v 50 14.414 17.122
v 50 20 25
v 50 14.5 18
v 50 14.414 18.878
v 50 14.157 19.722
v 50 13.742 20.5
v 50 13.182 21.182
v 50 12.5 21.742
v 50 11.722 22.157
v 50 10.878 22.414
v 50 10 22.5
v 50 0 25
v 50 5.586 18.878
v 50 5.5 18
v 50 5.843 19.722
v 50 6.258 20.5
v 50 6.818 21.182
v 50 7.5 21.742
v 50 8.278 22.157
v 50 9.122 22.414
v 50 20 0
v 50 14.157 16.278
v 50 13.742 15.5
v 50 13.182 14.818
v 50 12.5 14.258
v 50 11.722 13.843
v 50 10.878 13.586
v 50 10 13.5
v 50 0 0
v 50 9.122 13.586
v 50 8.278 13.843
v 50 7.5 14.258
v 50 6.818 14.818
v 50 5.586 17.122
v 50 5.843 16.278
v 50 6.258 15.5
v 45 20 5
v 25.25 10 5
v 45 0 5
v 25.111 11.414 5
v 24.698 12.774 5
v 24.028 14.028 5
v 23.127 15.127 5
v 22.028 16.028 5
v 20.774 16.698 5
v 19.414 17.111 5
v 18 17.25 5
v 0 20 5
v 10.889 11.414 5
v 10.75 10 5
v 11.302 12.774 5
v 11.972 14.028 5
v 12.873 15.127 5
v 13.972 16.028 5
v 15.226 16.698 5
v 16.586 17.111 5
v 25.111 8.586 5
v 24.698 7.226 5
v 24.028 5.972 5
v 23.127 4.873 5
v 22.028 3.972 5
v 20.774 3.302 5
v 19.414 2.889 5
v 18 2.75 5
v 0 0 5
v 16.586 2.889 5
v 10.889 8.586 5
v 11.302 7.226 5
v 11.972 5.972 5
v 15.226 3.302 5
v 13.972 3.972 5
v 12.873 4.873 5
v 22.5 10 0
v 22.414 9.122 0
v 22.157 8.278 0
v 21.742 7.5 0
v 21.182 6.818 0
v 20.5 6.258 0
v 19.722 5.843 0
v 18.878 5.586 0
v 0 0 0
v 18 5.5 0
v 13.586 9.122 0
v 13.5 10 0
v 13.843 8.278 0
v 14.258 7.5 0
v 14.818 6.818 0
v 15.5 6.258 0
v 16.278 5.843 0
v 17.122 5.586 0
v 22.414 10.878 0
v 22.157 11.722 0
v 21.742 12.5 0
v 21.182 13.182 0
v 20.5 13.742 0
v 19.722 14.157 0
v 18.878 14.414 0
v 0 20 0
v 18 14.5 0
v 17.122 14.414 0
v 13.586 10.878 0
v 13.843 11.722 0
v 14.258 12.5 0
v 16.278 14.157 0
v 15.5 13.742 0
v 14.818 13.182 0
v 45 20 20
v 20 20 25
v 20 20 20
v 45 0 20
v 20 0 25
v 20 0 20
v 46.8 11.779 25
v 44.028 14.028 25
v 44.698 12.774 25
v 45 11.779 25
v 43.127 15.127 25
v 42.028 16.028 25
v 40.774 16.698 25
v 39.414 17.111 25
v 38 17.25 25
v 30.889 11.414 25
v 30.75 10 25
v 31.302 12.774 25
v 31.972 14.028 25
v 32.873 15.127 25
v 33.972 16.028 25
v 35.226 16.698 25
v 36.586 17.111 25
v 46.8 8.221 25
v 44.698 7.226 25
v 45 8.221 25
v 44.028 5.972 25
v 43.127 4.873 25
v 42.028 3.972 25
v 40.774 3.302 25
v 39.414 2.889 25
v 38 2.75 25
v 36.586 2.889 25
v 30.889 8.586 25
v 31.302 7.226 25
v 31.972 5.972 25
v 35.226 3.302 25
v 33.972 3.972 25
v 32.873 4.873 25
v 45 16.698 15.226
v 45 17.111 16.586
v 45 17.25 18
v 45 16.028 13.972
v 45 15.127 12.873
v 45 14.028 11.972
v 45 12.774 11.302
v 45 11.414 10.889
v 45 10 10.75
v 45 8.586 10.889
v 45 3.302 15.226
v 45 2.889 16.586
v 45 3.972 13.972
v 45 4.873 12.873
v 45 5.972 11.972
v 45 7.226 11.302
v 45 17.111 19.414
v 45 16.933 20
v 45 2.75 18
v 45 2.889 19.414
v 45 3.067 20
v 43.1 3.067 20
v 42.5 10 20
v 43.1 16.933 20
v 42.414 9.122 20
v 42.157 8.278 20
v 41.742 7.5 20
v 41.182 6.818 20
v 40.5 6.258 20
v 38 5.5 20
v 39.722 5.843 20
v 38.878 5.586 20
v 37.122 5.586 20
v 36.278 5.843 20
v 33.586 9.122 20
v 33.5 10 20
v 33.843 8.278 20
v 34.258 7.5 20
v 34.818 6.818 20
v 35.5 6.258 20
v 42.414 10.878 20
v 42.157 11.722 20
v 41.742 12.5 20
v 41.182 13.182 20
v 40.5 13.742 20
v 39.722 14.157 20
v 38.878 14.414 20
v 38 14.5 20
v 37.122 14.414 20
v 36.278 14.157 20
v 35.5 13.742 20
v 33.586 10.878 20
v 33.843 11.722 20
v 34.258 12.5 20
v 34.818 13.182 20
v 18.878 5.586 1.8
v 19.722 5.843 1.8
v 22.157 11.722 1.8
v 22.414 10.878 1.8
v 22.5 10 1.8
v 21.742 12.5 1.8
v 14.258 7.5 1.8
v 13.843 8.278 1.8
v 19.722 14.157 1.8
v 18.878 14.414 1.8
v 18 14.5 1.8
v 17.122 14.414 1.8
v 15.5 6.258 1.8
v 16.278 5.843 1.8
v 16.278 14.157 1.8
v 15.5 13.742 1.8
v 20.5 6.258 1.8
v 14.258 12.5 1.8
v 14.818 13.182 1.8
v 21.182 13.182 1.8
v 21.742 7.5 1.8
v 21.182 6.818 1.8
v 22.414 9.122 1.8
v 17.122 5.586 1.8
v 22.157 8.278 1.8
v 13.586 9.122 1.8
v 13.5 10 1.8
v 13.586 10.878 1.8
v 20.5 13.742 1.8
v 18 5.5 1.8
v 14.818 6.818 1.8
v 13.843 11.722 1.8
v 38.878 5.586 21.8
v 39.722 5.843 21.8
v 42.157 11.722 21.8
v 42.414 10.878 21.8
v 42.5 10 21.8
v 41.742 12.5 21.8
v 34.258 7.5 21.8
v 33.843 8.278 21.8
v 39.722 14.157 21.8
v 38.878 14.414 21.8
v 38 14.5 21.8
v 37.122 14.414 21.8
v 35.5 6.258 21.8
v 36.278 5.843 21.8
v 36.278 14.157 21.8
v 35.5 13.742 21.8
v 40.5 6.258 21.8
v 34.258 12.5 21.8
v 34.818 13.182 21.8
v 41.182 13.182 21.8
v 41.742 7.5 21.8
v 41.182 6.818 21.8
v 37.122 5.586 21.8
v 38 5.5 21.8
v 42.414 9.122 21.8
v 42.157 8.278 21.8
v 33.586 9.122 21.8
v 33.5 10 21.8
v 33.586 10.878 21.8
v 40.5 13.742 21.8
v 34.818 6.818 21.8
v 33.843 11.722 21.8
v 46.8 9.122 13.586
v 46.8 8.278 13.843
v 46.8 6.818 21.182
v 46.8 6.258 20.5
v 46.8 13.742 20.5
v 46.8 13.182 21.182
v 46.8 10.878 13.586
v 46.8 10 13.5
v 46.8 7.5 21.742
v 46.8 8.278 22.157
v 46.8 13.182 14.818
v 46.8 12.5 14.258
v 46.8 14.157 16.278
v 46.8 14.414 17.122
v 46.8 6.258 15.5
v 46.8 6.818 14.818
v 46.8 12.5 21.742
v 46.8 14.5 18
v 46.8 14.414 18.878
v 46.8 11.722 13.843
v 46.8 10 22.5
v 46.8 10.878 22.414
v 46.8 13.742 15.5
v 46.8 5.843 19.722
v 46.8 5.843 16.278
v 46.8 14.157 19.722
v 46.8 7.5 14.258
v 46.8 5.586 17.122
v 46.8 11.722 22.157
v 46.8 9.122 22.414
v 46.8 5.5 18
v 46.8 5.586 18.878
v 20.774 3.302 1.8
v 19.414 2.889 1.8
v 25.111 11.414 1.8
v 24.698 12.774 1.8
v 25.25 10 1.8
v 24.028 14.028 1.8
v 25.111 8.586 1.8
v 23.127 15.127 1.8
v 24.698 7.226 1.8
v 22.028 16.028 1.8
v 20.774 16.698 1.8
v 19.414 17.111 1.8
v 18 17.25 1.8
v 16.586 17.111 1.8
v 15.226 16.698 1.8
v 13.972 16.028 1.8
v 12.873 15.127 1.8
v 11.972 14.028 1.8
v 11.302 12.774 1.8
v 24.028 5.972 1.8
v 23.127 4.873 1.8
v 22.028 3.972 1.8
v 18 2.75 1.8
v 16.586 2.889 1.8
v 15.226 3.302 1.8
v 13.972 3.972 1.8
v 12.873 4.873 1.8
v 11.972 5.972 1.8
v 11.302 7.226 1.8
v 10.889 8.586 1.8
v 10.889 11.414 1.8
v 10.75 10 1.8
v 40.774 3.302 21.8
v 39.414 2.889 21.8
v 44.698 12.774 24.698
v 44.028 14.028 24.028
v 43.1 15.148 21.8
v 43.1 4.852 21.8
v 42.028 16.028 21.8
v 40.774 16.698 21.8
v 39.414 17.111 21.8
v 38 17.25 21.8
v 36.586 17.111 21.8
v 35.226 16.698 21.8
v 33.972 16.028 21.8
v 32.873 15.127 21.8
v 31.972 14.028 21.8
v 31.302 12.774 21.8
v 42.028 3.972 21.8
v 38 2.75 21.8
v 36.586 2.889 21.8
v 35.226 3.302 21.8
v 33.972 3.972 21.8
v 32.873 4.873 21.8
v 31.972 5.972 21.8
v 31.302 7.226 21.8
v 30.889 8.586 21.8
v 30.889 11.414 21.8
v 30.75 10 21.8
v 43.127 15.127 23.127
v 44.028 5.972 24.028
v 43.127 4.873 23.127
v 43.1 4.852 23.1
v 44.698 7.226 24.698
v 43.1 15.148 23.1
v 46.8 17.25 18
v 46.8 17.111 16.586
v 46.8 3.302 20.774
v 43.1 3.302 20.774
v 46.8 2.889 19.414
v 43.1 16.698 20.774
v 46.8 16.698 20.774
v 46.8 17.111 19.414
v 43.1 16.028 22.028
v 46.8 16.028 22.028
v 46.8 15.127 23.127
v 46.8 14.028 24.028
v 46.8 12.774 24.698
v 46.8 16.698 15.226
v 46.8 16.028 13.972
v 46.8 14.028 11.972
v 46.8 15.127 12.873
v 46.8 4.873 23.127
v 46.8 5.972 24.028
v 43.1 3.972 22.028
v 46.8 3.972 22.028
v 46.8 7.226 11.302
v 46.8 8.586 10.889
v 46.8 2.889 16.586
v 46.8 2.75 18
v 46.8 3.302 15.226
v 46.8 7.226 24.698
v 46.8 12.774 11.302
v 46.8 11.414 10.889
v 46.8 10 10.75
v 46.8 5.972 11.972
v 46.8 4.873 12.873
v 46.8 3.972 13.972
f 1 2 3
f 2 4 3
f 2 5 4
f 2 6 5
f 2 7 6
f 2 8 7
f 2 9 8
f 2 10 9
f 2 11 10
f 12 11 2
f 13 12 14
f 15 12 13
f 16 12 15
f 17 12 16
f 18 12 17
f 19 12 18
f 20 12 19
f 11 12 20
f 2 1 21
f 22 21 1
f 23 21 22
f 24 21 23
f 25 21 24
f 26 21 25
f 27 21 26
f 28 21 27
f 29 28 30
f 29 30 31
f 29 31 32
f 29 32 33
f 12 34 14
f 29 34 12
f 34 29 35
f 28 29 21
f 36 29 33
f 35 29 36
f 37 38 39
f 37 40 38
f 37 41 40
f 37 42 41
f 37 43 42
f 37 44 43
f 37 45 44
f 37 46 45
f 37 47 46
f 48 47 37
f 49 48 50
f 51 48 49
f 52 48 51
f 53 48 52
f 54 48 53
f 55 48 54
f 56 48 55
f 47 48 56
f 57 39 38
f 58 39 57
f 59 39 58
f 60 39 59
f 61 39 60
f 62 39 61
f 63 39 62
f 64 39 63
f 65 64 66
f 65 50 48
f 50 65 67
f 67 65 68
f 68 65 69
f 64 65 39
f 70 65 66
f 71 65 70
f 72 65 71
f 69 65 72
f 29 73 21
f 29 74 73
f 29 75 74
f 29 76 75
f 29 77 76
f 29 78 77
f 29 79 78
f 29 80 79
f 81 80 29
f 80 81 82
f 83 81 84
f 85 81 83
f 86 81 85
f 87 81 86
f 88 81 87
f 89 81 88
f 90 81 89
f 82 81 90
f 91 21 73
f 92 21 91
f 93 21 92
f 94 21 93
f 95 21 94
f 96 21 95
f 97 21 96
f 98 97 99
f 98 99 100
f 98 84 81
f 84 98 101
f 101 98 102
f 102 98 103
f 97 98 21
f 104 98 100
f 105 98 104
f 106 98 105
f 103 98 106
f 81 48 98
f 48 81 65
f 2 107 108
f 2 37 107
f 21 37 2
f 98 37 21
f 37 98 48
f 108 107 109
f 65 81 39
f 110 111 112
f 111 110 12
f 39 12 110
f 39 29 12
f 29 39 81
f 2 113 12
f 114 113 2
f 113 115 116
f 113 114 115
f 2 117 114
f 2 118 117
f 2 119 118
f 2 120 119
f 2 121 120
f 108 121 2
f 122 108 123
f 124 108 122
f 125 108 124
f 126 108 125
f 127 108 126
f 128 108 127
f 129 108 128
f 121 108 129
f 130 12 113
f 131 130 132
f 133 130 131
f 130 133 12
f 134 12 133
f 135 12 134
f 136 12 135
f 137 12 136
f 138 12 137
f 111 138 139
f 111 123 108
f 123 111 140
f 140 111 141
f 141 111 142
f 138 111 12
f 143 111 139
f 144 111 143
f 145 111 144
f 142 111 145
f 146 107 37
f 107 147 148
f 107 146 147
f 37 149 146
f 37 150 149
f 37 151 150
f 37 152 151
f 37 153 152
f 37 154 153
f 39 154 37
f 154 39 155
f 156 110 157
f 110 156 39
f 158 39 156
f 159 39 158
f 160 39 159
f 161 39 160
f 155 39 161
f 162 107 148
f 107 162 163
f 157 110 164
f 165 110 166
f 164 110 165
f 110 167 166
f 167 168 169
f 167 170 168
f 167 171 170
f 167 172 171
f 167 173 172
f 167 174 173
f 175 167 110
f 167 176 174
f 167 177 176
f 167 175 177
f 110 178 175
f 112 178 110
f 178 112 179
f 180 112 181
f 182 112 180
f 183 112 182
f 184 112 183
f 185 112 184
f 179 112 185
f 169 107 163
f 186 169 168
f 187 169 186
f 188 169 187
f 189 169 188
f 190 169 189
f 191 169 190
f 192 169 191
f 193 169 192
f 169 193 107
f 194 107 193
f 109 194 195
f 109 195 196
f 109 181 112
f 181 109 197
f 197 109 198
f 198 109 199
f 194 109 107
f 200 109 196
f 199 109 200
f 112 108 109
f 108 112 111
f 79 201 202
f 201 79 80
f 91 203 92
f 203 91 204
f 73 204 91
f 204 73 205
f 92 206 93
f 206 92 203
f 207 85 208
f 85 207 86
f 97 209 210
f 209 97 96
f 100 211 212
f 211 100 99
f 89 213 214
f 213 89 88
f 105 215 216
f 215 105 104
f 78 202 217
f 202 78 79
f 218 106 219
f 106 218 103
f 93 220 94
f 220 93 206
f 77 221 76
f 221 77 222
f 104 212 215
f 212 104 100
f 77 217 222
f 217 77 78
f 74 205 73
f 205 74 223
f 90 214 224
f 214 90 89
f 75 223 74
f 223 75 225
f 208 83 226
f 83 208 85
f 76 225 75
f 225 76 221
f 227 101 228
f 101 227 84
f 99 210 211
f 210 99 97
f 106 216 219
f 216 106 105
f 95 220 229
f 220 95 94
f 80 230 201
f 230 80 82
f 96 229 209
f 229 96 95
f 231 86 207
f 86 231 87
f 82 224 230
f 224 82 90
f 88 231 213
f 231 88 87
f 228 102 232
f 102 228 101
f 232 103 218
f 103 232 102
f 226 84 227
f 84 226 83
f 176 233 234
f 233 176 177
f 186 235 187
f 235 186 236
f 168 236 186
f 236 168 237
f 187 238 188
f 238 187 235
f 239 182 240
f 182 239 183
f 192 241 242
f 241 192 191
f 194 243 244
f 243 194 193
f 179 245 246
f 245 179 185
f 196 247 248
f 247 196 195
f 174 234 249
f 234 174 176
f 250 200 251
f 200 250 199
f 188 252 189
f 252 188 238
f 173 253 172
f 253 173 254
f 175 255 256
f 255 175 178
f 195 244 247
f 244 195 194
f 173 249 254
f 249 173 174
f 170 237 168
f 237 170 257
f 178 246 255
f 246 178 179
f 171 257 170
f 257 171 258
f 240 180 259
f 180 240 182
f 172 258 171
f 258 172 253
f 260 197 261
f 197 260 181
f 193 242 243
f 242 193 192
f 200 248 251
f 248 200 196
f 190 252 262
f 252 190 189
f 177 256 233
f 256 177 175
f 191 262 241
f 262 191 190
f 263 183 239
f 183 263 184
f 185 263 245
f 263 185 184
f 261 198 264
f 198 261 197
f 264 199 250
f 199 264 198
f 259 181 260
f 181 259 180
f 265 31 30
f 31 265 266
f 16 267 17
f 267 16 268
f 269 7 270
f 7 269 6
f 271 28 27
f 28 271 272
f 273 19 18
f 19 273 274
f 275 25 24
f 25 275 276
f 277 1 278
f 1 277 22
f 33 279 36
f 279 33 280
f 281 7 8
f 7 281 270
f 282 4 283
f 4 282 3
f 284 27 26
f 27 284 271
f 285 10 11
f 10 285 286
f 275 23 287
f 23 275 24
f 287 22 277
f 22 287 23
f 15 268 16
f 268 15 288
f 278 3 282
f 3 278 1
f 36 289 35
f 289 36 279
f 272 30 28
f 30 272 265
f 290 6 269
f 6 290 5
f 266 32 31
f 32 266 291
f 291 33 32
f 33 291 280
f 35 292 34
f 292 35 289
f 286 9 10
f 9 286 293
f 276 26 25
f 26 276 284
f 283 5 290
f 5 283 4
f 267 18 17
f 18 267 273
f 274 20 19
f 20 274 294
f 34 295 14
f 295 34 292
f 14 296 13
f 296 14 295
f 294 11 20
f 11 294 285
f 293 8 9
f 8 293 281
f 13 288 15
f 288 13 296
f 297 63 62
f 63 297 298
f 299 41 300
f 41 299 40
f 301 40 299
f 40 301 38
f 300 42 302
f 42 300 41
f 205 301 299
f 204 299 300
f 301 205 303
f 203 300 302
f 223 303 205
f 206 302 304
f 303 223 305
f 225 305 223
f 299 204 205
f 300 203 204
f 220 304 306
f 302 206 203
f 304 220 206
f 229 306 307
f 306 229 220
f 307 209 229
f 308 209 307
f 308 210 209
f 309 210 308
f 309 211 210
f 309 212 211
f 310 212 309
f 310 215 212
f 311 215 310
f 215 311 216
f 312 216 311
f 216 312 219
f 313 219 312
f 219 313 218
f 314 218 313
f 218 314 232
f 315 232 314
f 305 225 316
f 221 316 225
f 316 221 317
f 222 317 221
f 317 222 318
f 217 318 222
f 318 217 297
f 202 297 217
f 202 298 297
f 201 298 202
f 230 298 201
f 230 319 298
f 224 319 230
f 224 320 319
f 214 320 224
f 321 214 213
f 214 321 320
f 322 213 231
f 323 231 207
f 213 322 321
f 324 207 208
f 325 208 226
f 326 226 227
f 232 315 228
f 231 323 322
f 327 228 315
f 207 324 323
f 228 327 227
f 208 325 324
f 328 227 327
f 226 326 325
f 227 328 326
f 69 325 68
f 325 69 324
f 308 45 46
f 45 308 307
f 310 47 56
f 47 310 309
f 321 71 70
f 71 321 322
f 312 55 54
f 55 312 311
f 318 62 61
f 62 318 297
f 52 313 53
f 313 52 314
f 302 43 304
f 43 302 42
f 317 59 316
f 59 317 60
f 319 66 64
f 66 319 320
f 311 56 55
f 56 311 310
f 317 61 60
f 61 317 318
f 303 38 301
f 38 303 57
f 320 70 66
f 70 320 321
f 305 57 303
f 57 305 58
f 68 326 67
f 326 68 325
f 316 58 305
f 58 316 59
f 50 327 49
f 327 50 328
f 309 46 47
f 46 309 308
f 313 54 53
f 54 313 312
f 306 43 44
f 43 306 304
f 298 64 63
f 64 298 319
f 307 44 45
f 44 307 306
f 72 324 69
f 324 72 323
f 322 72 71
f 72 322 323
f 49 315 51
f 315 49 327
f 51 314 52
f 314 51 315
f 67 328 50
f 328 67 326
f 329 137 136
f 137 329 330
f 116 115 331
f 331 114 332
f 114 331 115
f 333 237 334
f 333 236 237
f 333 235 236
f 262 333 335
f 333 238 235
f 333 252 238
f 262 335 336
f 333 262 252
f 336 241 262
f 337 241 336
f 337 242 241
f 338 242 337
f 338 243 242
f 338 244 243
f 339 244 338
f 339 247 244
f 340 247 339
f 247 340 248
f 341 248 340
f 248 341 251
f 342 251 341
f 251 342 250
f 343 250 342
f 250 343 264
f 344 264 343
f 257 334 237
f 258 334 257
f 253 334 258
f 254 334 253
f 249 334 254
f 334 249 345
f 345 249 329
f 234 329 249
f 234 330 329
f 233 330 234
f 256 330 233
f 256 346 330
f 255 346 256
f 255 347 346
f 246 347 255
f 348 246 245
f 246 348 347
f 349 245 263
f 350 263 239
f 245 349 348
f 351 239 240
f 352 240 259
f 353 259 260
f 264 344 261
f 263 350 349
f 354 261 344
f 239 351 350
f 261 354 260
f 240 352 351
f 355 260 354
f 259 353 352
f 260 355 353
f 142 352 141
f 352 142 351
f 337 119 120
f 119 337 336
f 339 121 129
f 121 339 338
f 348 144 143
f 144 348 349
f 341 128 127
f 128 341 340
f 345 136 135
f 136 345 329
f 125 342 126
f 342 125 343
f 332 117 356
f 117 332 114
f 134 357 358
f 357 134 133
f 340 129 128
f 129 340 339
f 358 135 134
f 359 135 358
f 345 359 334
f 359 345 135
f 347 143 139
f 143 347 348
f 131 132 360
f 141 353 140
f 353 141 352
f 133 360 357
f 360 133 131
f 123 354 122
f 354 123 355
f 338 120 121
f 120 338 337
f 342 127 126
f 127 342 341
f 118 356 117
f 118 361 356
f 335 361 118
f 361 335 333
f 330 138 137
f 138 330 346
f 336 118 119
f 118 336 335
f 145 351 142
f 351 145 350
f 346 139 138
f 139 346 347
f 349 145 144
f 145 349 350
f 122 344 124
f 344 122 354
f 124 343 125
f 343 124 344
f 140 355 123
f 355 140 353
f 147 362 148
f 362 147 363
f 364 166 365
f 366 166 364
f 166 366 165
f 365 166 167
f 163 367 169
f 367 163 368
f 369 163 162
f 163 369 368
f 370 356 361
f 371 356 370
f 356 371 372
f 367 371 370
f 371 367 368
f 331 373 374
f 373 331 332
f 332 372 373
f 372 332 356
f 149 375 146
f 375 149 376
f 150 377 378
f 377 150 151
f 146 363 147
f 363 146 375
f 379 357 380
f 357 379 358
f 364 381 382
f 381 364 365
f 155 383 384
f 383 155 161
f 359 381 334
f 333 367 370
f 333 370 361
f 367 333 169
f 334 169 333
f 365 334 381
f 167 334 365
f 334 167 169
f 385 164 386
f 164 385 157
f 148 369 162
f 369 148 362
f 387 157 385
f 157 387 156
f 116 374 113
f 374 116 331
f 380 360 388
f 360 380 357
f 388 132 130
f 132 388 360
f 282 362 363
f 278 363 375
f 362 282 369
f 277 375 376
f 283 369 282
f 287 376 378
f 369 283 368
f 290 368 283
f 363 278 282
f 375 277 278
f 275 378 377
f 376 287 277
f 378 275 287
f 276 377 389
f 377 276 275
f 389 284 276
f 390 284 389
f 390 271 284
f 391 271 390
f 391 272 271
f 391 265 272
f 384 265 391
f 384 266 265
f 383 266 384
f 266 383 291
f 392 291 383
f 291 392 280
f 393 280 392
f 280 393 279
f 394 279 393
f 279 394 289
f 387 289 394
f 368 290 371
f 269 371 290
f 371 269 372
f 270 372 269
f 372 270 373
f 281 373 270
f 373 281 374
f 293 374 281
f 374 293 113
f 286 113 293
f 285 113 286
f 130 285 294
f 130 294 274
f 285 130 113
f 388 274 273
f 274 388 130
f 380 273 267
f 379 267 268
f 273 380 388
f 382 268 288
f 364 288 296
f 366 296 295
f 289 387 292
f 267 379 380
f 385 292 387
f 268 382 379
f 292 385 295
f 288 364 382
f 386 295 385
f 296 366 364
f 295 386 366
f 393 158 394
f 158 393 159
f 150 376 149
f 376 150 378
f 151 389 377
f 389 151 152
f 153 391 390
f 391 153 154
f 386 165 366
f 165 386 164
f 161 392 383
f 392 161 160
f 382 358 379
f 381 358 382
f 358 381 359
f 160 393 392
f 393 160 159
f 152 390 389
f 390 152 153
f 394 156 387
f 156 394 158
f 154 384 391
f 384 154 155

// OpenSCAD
$fn = 32;

// ----------------------------------------------------------------------
// Z-bracket: 50 x 20 x 25 mm
// ----------------------------------------------------------------------

// --- parameters (mm) ---
lower_len = 50;           // lower foot length, X
upper_len = 25;           // upper foot length, X
width = 20;               // bracket width, Y
rise = 25;                // overall rise, Z
thick = 5;                // plate thickness
hole_d = 9;               // clearance for M8
cb_d = 14.5;              // counterbore diameter
cb_h = 3.2;               // counterbore depth

module hole_z(px, py, z0) {
  translate([px, py, z0 - 0.5]) cylinder(h = thick + 1, d = hole_d);
}
module hole_x(py, pz) {
  translate([-0.5, py, pz]) rotate([0, 90, 0]) cylinder(h = thick + 1, d = hole_d);
}
module cb_z(px, py, top_z) {
  translate([px, py, top_z - cb_h]) cylinder(h = cb_h + 0.5, d = cb_d);
}
module cb_x(py, pz) {
  translate([thick - cb_h, py, pz]) rotate([0, -90, 0]) cylinder(h = cb_h + 0.5, d = cb_d);
}

difference() {
  union() {
    cube([lower_len, width, thick]);
    /* web, overlapping the lower foot */
    translate([lower_len - thick, 0, 0]) cube([thick, width, rise]);
    /* upper foot, sunk into the web */
    translate([lower_len - thick - upper_len, 0, rise - thick]) cube([upper_len + thick, width, thick]);
  }
  hole_z(18, 10, 0);
  translate([lower_len - thick - 7, 0, 0]) hole_z(0, 10, rise - thick);
  translate([lower_len - thick, 0, 0]) hole_x(10, 18);
  cb_z(18, 10, thick);
  translate([lower_len - thick - 7, 0, 0]) cb_z(0, 10, rise);
  translate([lower_len - thick, 0, 0]) cb_x(10, 18);
}
